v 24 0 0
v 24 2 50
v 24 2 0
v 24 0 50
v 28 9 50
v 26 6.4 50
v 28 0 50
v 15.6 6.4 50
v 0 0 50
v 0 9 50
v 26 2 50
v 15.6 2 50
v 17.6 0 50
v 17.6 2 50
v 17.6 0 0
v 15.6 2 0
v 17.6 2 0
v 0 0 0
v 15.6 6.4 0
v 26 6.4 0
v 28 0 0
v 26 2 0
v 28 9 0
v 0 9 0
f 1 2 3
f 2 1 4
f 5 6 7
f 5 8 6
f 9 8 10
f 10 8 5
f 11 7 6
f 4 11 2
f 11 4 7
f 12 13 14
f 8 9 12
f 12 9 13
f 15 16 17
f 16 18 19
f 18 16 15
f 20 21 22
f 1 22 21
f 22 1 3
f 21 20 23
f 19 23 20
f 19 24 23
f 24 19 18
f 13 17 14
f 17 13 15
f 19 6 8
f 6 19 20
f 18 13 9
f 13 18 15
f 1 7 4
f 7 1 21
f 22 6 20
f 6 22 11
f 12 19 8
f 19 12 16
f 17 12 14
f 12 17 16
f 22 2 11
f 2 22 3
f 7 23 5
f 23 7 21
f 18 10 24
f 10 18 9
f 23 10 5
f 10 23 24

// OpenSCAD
//Breite Schiene
b=28;
//Tiefe Schiene
t=9;
//Laenge Schiene
l=50;

//Breite Schlitz
bs=6.4;
//Tiefe Schlitz (ab Vorderseite)
ts=6.4;
//Abstand Schlitz zum rechten Rand
ar=4;

//Ueberstand Gleiterkanal links und rechts neben dem Schlitz
uk=2;
//Staerke der Lippe vor dem Gleiterkanal
sl=2;

//Aussparung fuer die Gleiter: Schlitz vorne, breiterer Kanal dahinter
module gleiterkanal()
{
    translate([b-ar-bs,0,0])
    cube([bs,ts,l]);

    translate([b-ar-bs-uk,sl,0])
    cube([bs+2*uk,ts-sl,l]);
}

difference()
{
    cube([b,t,l]);
    gleiterkanal();
}
